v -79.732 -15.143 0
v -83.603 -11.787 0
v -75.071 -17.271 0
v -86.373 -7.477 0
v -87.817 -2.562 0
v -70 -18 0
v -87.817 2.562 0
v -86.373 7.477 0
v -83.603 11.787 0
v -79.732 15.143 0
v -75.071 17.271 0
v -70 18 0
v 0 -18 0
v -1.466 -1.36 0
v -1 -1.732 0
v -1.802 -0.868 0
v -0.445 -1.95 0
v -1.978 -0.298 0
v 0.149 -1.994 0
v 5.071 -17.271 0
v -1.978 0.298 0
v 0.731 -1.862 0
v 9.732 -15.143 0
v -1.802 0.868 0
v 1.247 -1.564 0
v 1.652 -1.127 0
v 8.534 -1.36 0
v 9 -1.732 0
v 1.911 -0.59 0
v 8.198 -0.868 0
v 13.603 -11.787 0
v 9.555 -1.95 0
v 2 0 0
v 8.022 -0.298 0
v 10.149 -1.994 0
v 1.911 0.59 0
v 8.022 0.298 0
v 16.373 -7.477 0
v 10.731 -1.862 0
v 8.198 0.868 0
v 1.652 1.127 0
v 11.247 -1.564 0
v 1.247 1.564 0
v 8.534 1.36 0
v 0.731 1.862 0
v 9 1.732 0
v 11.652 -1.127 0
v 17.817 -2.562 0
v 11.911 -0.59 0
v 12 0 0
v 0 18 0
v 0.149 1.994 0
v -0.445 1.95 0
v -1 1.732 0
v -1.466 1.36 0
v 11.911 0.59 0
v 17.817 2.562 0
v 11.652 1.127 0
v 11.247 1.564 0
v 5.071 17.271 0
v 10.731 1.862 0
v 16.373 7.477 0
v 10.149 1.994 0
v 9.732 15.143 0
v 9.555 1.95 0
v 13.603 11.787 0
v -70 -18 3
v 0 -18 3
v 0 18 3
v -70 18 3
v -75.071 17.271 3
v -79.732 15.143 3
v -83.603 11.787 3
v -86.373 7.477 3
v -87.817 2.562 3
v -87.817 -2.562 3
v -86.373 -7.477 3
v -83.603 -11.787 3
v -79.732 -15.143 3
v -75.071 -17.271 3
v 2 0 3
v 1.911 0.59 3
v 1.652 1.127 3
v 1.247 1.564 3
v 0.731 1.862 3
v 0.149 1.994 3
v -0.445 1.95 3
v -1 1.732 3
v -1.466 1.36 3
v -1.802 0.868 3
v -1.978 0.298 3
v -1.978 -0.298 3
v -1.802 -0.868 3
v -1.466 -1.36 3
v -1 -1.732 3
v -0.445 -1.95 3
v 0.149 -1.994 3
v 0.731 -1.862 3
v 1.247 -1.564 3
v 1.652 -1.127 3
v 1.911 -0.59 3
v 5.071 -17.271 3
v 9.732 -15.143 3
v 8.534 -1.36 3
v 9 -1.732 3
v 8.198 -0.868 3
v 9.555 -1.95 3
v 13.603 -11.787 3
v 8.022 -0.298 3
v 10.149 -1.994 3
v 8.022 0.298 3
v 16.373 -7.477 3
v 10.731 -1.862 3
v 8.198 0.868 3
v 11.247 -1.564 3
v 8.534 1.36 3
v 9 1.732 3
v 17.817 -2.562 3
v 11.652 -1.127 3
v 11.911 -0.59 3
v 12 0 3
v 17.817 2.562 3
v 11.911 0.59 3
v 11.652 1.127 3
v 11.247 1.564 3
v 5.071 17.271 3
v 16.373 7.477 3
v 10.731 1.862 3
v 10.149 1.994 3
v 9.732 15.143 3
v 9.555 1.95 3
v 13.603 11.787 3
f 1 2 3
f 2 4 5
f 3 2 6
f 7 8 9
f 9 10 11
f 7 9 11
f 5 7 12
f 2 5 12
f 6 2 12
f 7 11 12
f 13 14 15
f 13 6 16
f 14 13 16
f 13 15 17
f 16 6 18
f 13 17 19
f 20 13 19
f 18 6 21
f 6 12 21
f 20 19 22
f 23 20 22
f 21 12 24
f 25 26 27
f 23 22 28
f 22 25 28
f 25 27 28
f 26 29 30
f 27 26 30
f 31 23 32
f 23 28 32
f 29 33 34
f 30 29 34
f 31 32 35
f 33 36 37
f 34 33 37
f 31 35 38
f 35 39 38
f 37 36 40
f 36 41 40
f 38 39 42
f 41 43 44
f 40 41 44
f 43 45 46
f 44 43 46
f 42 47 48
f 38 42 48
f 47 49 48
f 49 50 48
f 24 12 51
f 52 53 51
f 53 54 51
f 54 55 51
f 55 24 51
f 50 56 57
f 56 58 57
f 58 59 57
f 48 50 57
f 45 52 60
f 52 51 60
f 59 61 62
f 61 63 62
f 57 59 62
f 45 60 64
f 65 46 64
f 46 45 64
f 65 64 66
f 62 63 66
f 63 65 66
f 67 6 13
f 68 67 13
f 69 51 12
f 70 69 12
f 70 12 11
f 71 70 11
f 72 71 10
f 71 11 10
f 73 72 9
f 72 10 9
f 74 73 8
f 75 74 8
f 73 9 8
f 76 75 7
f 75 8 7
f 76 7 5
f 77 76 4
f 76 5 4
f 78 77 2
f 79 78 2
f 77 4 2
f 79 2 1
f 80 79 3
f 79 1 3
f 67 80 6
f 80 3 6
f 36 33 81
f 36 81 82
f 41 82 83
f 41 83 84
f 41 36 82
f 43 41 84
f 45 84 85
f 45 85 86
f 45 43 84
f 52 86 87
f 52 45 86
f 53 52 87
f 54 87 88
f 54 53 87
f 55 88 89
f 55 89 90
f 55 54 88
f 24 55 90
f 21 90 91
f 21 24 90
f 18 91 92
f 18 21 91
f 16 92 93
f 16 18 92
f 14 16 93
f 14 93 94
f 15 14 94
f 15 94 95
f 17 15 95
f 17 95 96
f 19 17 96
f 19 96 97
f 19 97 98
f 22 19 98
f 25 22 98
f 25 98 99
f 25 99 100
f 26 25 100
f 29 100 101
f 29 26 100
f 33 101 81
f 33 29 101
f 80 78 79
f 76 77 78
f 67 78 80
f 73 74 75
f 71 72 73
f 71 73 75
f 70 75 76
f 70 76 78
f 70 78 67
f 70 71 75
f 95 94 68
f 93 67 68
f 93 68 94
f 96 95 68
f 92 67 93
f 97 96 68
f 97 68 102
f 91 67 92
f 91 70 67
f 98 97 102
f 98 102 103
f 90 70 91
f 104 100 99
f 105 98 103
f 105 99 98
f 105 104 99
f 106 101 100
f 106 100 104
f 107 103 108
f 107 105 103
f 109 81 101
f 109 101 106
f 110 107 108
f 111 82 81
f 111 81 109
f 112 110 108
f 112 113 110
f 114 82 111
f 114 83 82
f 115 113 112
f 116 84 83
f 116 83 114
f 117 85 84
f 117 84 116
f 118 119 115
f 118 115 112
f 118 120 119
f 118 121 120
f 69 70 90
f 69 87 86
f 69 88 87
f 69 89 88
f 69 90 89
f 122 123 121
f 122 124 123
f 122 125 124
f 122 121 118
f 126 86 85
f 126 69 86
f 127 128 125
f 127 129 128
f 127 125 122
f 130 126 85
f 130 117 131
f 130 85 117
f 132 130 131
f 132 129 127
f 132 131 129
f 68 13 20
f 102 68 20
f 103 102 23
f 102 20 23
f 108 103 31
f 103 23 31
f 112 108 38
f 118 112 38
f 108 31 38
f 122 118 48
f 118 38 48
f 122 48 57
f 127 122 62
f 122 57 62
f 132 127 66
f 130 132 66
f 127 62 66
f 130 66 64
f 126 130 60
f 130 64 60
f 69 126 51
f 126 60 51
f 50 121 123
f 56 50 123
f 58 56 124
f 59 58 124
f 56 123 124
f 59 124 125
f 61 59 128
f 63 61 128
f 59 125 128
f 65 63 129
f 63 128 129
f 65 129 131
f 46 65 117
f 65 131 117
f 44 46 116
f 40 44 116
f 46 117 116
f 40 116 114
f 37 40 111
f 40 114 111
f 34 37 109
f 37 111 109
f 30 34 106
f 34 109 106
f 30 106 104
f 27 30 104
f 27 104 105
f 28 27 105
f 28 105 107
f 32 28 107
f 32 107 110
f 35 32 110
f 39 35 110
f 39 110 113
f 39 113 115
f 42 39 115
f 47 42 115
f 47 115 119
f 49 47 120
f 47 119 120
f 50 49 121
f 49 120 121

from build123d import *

# Parameters (mm, degrees)
SKETCH1_R           = 2
BOSS_EXTRUDE1_DEPTH = 3
SKETCH3_R           = 2
CUT_EXTRUDE1_DEPTH  = 3


with BuildPart() as part:
    # Sketch1 → Boss-Extrude1 (new body)
    with BuildSketch(Plane.XY):
        with BuildLine():
            Line((0, 18), (-70, 18))
            ThreePointArc((-70, 18), (-88, 0), (-70, -18))
            Line((-70, -18), (0, -18))
            ThreePointArc((0, -18), (18, 0), (0, 18))
        make_face()
        Circle(SKETCH1_R, mode=Mode.SUBTRACT)
    extrude(amount=BOSS_EXTRUDE1_DEPTH)

    # Sketch3 → Cut-Extrude1 (cut)
    with BuildSketch(Plane.XY.offset(3)):
        with Locations((10, 0)):
            Circle(SKETCH3_R)
    extrude(amount=-CUT_EXTRUDE1_DEPTH, mode=Mode.SUBTRACT)


solid = part.part
